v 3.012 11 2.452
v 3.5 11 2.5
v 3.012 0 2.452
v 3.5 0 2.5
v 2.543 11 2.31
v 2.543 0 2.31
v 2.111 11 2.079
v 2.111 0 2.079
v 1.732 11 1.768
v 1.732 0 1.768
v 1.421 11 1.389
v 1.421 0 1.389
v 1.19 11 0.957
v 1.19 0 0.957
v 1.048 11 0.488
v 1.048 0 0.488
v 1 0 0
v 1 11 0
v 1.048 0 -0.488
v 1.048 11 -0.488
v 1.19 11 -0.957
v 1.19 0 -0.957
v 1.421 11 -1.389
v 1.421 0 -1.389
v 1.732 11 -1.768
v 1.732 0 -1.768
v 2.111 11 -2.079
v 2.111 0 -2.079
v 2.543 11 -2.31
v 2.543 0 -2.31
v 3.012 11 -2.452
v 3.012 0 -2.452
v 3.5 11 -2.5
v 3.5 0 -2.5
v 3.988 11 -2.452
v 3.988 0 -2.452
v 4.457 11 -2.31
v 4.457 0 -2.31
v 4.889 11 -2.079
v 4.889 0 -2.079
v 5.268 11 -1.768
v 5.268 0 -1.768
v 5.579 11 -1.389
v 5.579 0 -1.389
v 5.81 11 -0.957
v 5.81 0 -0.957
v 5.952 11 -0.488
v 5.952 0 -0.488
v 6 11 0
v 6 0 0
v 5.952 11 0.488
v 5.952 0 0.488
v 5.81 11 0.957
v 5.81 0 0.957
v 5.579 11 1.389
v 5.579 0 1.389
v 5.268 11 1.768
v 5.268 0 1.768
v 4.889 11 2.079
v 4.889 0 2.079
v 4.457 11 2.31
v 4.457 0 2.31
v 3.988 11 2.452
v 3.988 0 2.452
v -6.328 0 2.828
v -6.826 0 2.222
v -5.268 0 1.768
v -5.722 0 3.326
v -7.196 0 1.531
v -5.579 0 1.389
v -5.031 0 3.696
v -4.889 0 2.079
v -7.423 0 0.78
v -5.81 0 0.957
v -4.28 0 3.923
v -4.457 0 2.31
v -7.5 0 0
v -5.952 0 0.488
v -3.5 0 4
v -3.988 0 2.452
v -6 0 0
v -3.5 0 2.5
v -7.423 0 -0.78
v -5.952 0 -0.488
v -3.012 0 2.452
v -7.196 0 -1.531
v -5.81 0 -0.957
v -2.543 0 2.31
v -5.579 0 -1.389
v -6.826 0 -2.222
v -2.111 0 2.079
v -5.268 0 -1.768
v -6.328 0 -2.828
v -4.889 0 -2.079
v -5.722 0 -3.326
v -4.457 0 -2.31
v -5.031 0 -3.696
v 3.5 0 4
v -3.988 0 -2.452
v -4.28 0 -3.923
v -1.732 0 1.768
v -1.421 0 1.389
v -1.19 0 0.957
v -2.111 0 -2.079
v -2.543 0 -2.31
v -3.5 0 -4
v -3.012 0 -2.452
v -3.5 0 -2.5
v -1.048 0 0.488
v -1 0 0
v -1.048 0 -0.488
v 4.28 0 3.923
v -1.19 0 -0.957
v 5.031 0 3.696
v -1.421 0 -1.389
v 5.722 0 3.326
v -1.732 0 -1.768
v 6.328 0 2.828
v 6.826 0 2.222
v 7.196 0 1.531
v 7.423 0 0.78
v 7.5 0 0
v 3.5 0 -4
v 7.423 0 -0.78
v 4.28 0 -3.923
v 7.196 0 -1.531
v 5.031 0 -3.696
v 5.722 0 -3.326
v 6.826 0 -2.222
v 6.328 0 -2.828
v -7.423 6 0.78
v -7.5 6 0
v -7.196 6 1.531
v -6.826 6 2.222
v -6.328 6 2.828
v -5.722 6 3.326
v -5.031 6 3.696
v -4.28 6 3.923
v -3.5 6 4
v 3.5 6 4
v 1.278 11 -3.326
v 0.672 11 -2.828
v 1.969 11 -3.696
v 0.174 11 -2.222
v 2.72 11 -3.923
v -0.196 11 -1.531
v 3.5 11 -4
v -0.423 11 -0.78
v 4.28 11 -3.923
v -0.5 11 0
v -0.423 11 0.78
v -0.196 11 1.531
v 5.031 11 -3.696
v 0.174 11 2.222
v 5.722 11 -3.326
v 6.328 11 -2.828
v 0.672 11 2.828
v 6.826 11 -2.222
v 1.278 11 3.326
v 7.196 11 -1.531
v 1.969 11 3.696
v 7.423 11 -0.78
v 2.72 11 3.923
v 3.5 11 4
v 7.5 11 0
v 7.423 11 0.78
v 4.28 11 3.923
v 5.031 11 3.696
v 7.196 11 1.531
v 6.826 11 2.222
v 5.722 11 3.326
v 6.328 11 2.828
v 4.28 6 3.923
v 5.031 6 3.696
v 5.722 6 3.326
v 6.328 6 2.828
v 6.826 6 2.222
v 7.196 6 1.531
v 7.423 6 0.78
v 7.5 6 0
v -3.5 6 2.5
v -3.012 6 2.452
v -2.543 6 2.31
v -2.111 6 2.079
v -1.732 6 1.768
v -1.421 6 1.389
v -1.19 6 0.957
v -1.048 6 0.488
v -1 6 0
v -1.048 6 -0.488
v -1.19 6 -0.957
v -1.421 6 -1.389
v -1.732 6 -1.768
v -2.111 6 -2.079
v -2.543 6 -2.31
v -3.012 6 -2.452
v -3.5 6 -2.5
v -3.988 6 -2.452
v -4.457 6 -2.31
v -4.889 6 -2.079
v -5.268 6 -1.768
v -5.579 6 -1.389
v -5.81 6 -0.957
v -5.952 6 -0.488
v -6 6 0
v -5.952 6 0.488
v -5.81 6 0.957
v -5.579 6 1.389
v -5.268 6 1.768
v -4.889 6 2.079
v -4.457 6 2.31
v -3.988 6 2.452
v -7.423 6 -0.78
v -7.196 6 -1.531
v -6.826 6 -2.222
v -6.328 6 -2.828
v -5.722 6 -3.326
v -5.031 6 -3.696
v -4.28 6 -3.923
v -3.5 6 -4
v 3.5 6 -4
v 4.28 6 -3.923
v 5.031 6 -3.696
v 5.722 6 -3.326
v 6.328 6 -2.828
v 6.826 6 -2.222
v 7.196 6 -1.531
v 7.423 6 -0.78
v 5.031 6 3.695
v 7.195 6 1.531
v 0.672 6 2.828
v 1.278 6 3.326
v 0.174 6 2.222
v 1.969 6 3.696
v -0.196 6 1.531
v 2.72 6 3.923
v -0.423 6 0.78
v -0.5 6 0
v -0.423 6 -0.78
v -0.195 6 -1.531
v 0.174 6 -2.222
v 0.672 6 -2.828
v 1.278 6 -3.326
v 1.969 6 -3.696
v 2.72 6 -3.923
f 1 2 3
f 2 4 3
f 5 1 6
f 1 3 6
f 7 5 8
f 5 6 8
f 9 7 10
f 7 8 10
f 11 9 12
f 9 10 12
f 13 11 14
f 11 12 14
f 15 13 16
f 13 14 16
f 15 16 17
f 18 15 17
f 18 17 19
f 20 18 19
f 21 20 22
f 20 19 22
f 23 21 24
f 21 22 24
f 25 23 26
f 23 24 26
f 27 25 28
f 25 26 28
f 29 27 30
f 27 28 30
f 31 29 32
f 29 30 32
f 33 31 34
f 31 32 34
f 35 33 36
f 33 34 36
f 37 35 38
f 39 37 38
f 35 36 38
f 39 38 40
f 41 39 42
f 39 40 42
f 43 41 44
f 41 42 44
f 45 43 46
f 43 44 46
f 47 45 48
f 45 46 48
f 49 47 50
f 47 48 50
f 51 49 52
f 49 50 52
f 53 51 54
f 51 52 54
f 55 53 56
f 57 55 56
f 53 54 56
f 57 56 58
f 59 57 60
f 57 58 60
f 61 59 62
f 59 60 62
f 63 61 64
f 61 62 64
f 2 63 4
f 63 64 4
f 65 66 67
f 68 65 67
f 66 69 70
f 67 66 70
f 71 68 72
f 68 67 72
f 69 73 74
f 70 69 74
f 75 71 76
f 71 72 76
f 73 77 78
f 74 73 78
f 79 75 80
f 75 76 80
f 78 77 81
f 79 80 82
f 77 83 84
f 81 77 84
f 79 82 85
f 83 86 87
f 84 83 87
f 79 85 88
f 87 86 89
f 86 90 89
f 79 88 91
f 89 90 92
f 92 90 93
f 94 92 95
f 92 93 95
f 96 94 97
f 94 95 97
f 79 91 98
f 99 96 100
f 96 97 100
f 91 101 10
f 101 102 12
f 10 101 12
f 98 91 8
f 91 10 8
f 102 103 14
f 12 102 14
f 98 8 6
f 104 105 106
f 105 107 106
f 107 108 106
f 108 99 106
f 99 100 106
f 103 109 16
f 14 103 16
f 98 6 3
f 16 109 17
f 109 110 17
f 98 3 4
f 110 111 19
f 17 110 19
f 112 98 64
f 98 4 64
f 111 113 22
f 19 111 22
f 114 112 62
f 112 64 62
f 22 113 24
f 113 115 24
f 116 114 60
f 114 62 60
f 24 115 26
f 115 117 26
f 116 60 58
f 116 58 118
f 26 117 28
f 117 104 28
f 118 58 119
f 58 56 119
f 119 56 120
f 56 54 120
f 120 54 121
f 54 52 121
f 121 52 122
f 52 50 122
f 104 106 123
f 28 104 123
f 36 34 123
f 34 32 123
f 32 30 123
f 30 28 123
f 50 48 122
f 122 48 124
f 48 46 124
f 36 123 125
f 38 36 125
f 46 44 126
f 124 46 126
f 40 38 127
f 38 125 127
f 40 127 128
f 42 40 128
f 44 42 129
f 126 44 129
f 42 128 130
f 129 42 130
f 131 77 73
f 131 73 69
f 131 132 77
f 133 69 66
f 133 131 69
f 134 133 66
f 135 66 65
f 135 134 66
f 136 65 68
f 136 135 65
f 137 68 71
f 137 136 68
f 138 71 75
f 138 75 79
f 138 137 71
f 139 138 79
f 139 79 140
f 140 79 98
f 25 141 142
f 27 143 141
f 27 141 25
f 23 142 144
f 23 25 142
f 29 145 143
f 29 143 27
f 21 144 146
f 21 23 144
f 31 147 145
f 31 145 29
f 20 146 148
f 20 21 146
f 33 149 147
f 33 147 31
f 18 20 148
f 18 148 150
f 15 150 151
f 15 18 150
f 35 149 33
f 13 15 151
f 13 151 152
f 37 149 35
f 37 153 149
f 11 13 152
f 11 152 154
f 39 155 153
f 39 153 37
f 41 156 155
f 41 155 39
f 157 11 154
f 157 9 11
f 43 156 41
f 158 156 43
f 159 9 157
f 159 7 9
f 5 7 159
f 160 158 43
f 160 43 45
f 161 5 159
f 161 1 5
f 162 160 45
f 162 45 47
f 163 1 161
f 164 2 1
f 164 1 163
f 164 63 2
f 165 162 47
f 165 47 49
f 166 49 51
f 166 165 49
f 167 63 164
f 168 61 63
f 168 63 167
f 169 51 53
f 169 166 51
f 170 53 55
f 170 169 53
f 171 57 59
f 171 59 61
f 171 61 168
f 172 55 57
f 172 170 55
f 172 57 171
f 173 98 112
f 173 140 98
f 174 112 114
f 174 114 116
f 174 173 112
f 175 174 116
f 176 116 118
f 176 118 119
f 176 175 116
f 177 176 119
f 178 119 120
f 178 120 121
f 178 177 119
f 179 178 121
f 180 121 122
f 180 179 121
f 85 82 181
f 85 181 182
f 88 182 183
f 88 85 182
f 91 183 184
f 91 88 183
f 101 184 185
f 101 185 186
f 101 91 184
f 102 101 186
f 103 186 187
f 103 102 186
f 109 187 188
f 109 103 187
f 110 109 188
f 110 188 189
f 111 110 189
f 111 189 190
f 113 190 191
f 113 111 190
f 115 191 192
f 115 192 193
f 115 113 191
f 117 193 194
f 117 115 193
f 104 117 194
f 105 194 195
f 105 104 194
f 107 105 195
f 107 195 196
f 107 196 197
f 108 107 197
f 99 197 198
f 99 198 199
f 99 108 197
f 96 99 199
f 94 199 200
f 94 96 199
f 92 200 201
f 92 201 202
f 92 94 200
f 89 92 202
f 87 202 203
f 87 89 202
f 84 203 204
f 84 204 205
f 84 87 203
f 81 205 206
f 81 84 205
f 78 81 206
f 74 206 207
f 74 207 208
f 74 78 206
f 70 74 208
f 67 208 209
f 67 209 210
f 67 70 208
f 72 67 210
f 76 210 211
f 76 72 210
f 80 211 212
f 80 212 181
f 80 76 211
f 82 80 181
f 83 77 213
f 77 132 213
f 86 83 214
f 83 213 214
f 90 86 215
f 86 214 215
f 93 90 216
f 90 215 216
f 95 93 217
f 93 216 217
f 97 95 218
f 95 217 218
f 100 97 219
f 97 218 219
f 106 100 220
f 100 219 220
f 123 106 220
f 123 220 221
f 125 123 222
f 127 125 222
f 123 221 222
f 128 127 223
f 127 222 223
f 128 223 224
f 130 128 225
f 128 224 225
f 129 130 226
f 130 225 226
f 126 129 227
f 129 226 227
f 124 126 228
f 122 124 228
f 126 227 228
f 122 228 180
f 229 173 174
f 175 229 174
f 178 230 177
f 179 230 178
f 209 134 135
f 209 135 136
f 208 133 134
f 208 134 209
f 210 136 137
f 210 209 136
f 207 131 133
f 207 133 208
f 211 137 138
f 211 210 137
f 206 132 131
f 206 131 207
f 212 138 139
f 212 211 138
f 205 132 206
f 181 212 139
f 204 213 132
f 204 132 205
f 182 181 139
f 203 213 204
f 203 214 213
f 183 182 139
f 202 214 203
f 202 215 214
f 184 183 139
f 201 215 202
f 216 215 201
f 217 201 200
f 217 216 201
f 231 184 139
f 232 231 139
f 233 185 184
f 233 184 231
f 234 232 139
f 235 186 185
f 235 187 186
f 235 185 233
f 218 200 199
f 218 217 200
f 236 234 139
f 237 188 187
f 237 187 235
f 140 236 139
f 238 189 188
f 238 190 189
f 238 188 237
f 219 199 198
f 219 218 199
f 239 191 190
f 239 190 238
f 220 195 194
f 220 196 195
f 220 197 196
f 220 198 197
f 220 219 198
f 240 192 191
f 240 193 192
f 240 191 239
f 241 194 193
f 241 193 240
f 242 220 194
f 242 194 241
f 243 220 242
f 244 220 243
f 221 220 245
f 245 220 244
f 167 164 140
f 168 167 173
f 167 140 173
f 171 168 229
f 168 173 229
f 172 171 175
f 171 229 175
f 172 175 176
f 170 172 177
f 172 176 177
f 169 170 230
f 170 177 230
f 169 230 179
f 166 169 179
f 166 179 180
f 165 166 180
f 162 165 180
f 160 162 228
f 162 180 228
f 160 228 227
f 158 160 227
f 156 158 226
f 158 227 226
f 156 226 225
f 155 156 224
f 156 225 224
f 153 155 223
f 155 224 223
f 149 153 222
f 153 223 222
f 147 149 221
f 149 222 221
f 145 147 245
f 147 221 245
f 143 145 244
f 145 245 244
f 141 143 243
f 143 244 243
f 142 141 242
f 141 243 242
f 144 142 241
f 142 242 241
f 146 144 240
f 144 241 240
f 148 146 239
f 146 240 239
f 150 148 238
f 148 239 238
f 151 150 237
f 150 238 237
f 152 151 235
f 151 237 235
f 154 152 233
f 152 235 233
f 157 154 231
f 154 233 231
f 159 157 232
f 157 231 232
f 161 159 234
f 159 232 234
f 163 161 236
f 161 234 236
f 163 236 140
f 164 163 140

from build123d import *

# Parameters (mm, degrees)
SKETCH1_W           = 15
SKETCH1_H           = 8
SKETCH1_R           = 2.5
BOSS_EXTRUDE1_DEPTH = 6
FILLET1_R           = 4
SKETCH2_R           = 4
BOSS_EXTRUDE2_DEPTH = 5
SKETCH4_R           = 2.5
CUT_EXTRUDE1_DEPTH  = 25


with BuildPart() as part:
    # Sketch1 → Boss-Extrude1 (new body)
    with BuildSketch(Plane(origin=(0, 0, 0), x_dir=(1, 0, 0), z_dir=(0, 1, 0))):
        Rectangle(SKETCH1_W, SKETCH1_H)
        with Locations(Location((-3.5, 0, 0), (0, 0, 270))):
            Circle(SKETCH1_R, mode=Mode.SUBTRACT)
        with Locations(Location((3.5, 0, 0), (0, 0, 270))):
            Circle(SKETCH1_R, mode=Mode.SUBTRACT)
    extrude(amount=BOSS_EXTRUDE1_DEPTH)

    # Fillet1
    fillet1_edges = [part.edges().sort_by_distance(p)[0] for p in [
        (-7.5, 3, -4),
        (7.5, 3, -4),
        (7.5, 3, 4),
        (-7.5, 3, 4),
    ]]
    fillet(fillet1_edges, radius=FILLET1_R - 0.0001)  # a hair under: the kernel refuses the full size

    # Sketch2 → Boss-Extrude2 (add)
    with BuildSketch(Plane(origin=(0, 6, 0), x_dir=(1, 0, 0), z_dir=(0, 1, 0))):
        with Locations(Location((3.5, 0, 0), (0, 0, 270))):
            Circle(SKETCH2_R)
    extrude(amount=BOSS_EXTRUDE2_DEPTH)

    # Sketch4 → Cut-Extrude1 (cut)
    with BuildSketch(Plane.XZ.offset(-6)):
        with Locations(Location((3.5, 0, 0), (0, 0, 90))):
            Circle(SKETCH4_R)
    extrude(amount=-CUT_EXTRUDE1_DEPTH, mode=Mode.SUBTRACT)


solid = part.part
